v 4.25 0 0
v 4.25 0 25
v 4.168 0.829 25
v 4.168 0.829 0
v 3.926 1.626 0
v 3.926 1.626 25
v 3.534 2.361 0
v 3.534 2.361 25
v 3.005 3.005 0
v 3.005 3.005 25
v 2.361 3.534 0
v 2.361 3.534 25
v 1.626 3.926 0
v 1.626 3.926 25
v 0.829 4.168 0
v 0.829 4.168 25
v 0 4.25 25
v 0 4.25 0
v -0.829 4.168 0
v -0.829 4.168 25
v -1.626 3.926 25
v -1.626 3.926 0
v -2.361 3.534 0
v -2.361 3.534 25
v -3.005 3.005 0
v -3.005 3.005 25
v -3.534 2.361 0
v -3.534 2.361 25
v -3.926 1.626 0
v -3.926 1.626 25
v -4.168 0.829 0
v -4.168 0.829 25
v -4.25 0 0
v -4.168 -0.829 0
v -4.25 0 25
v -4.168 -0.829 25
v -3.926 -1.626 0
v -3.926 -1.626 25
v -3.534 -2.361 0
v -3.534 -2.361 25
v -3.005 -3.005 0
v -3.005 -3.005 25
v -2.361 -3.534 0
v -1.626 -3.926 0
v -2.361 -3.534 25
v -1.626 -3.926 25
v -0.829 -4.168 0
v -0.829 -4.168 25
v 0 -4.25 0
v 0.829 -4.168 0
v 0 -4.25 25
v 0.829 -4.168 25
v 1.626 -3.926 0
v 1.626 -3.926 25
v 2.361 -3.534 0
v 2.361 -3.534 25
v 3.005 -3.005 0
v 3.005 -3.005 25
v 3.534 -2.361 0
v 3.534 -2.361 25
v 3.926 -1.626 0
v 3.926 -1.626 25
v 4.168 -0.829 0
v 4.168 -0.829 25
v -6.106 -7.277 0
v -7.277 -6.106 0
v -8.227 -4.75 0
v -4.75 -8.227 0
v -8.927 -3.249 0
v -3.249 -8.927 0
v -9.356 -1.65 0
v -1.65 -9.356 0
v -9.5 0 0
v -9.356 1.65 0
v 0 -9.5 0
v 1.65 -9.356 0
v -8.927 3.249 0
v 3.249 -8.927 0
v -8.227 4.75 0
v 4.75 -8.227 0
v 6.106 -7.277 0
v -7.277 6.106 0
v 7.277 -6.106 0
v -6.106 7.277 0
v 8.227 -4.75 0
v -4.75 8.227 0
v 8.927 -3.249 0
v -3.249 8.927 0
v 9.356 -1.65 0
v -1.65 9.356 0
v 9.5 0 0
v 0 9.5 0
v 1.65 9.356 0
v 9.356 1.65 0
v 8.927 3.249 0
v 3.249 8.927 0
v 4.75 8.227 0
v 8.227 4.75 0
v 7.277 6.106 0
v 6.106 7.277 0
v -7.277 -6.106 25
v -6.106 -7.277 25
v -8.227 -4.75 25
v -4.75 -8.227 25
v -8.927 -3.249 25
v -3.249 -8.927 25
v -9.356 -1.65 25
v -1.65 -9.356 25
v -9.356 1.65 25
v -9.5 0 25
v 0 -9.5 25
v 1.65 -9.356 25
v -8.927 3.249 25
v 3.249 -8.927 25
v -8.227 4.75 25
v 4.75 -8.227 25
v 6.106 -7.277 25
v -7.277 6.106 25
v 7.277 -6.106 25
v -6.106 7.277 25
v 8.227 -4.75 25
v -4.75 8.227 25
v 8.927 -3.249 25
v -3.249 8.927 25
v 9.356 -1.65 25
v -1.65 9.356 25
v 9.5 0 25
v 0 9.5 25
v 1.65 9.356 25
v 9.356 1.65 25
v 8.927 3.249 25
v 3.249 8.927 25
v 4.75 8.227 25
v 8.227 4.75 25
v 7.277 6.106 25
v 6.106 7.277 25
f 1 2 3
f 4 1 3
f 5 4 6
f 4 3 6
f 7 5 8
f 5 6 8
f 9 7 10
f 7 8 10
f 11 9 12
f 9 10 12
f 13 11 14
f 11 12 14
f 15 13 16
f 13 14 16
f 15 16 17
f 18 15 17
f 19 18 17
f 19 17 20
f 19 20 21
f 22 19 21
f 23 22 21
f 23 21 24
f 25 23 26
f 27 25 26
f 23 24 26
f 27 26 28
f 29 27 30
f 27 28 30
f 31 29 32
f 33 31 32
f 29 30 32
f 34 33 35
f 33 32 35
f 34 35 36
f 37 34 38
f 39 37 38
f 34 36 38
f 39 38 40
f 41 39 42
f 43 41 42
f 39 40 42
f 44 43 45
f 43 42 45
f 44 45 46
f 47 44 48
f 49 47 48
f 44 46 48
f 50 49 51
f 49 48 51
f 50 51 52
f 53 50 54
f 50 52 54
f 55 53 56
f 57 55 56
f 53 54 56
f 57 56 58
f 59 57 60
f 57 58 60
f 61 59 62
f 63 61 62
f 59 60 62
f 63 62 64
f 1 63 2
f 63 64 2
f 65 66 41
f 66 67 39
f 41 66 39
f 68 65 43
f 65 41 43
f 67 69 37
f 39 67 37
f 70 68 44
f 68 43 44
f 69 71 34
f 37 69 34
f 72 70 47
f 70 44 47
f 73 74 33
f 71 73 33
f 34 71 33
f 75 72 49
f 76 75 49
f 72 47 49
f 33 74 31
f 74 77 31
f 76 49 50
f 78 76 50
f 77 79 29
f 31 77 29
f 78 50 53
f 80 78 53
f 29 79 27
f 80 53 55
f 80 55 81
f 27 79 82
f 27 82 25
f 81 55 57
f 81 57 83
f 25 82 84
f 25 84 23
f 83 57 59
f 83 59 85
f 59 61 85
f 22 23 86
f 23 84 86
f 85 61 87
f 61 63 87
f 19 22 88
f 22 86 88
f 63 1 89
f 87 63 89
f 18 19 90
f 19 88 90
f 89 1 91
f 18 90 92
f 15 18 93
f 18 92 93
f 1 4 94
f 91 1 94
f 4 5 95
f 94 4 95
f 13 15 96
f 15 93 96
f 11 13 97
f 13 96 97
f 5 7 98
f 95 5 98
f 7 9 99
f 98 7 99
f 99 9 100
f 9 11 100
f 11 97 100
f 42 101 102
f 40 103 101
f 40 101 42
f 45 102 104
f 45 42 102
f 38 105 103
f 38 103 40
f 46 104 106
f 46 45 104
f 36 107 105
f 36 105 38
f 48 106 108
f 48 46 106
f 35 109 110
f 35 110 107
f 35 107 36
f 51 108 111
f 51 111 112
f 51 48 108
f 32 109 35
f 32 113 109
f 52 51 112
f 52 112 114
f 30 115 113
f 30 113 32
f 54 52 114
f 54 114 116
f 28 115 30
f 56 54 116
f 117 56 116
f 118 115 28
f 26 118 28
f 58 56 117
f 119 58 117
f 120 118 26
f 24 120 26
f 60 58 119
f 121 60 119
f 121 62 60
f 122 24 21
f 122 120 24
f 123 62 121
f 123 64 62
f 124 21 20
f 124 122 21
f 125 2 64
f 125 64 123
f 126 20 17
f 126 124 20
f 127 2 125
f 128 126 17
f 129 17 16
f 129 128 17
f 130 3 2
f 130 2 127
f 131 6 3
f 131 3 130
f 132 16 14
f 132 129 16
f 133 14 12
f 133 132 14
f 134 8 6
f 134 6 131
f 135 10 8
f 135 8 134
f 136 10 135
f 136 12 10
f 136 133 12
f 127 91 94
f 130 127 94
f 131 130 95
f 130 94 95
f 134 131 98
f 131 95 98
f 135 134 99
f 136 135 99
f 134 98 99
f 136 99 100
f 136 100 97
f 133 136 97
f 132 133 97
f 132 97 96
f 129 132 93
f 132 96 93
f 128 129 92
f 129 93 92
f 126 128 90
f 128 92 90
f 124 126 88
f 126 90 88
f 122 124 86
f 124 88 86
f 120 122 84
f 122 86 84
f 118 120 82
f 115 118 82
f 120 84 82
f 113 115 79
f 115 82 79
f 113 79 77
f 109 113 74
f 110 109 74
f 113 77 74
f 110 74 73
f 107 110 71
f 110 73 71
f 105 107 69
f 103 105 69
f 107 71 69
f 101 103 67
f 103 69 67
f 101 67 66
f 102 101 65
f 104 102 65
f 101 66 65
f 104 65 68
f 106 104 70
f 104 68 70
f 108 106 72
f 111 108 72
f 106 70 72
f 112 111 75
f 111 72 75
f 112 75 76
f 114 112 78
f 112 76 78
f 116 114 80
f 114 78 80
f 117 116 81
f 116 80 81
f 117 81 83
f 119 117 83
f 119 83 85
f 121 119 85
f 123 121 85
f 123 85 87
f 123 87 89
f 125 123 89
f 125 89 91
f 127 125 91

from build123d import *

# Parameters (mm, degrees)
SKETCH1_R           = 9.5
BOSS_EXTRUDE1_DEPTH = 25
SKETCH1_3_R         = 9.5
BOSS_EXTRUDE2_DEPTH = 25
SKETCH2_R           = 4.25
CUT_EXTRUDE1_DEPTH  = 25


with BuildPart() as part:
    # Sketch1 → Boss-Extrude1 (new body)
    with BuildSketch(Plane.XY):
        Circle(SKETCH1_R)
    extrude(amount=BOSS_EXTRUDE1_DEPTH)

    # Sketch1<3> → Boss-Extrude2 (add)
    with BuildSketch(Plane.XY):
        Circle(SKETCH1_3_R)
    extrude(amount=BOSS_EXTRUDE2_DEPTH)

    # Sketch2 → Cut-Extrude1 (cut)
    with BuildSketch(Plane.XY.offset(25)):
        Circle(SKETCH2_R)
    extrude(amount=-CUT_EXTRUDE1_DEPTH, mode=Mode.SUBTRACT)


solid = part.part
